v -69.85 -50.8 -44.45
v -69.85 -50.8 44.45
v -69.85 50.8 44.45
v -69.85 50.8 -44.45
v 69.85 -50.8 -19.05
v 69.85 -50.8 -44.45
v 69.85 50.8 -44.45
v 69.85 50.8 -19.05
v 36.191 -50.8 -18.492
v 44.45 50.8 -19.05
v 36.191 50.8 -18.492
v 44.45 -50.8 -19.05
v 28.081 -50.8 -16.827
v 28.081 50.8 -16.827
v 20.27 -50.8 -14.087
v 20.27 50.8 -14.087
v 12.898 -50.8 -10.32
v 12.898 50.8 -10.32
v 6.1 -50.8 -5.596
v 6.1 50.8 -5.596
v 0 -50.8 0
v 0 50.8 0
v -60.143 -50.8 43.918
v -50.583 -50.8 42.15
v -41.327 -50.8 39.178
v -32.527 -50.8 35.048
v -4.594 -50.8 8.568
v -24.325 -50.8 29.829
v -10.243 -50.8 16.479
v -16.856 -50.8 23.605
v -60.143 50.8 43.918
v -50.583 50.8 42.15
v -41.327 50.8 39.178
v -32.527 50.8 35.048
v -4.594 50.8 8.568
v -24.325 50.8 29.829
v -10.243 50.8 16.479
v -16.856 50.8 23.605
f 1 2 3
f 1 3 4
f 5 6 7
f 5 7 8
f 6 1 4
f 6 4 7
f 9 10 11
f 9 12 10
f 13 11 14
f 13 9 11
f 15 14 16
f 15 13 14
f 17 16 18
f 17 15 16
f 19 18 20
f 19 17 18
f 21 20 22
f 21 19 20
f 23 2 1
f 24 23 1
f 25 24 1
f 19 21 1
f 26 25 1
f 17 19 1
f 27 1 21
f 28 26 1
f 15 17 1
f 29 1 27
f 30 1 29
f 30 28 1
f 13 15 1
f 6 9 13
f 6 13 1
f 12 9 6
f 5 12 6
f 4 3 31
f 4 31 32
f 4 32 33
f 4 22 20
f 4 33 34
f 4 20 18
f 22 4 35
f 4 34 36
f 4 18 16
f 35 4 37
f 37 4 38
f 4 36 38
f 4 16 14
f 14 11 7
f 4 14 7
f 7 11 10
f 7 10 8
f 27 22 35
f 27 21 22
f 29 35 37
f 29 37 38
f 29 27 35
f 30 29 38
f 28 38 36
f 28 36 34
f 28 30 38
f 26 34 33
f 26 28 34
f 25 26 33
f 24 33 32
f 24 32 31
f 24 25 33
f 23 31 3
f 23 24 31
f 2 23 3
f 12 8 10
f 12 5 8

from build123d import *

# Parameters (mm, degrees)
F1_DEPTH      = 50.8
F1_DEPTH_BACK = 50.8


with BuildPart() as f1:
    # F0 (on Front) → F1 (new body, two sides)
    with BuildSketch(Plane.XZ) as f1_sk:
        with BuildLine():
            ThreePointArc((0, 0), (-28.342106, 32.569547), (-69.85, 44.45))
            Line((-69.85, 44.45), (-69.85, 0))
            Line((-69.85, 0), (-69.85, -44.45))
            Line((-69.85, -44.45), (0, -44.45))
            Line((0, -44.45), (69.85, -44.45))
            Line((69.85, -44.45), (69.85, -19.05))
            Line((69.85, -19.05), (44.45, -19.05))
            ThreePointArc((44.45, -19.05), (20.26992, -14.086852), (0, 0))
        make_face()
    extrude(amount=F1_DEPTH)
    extrude(f1_sk.sketch, amount=-F1_DEPTH_BACK)


solid = f1.part
